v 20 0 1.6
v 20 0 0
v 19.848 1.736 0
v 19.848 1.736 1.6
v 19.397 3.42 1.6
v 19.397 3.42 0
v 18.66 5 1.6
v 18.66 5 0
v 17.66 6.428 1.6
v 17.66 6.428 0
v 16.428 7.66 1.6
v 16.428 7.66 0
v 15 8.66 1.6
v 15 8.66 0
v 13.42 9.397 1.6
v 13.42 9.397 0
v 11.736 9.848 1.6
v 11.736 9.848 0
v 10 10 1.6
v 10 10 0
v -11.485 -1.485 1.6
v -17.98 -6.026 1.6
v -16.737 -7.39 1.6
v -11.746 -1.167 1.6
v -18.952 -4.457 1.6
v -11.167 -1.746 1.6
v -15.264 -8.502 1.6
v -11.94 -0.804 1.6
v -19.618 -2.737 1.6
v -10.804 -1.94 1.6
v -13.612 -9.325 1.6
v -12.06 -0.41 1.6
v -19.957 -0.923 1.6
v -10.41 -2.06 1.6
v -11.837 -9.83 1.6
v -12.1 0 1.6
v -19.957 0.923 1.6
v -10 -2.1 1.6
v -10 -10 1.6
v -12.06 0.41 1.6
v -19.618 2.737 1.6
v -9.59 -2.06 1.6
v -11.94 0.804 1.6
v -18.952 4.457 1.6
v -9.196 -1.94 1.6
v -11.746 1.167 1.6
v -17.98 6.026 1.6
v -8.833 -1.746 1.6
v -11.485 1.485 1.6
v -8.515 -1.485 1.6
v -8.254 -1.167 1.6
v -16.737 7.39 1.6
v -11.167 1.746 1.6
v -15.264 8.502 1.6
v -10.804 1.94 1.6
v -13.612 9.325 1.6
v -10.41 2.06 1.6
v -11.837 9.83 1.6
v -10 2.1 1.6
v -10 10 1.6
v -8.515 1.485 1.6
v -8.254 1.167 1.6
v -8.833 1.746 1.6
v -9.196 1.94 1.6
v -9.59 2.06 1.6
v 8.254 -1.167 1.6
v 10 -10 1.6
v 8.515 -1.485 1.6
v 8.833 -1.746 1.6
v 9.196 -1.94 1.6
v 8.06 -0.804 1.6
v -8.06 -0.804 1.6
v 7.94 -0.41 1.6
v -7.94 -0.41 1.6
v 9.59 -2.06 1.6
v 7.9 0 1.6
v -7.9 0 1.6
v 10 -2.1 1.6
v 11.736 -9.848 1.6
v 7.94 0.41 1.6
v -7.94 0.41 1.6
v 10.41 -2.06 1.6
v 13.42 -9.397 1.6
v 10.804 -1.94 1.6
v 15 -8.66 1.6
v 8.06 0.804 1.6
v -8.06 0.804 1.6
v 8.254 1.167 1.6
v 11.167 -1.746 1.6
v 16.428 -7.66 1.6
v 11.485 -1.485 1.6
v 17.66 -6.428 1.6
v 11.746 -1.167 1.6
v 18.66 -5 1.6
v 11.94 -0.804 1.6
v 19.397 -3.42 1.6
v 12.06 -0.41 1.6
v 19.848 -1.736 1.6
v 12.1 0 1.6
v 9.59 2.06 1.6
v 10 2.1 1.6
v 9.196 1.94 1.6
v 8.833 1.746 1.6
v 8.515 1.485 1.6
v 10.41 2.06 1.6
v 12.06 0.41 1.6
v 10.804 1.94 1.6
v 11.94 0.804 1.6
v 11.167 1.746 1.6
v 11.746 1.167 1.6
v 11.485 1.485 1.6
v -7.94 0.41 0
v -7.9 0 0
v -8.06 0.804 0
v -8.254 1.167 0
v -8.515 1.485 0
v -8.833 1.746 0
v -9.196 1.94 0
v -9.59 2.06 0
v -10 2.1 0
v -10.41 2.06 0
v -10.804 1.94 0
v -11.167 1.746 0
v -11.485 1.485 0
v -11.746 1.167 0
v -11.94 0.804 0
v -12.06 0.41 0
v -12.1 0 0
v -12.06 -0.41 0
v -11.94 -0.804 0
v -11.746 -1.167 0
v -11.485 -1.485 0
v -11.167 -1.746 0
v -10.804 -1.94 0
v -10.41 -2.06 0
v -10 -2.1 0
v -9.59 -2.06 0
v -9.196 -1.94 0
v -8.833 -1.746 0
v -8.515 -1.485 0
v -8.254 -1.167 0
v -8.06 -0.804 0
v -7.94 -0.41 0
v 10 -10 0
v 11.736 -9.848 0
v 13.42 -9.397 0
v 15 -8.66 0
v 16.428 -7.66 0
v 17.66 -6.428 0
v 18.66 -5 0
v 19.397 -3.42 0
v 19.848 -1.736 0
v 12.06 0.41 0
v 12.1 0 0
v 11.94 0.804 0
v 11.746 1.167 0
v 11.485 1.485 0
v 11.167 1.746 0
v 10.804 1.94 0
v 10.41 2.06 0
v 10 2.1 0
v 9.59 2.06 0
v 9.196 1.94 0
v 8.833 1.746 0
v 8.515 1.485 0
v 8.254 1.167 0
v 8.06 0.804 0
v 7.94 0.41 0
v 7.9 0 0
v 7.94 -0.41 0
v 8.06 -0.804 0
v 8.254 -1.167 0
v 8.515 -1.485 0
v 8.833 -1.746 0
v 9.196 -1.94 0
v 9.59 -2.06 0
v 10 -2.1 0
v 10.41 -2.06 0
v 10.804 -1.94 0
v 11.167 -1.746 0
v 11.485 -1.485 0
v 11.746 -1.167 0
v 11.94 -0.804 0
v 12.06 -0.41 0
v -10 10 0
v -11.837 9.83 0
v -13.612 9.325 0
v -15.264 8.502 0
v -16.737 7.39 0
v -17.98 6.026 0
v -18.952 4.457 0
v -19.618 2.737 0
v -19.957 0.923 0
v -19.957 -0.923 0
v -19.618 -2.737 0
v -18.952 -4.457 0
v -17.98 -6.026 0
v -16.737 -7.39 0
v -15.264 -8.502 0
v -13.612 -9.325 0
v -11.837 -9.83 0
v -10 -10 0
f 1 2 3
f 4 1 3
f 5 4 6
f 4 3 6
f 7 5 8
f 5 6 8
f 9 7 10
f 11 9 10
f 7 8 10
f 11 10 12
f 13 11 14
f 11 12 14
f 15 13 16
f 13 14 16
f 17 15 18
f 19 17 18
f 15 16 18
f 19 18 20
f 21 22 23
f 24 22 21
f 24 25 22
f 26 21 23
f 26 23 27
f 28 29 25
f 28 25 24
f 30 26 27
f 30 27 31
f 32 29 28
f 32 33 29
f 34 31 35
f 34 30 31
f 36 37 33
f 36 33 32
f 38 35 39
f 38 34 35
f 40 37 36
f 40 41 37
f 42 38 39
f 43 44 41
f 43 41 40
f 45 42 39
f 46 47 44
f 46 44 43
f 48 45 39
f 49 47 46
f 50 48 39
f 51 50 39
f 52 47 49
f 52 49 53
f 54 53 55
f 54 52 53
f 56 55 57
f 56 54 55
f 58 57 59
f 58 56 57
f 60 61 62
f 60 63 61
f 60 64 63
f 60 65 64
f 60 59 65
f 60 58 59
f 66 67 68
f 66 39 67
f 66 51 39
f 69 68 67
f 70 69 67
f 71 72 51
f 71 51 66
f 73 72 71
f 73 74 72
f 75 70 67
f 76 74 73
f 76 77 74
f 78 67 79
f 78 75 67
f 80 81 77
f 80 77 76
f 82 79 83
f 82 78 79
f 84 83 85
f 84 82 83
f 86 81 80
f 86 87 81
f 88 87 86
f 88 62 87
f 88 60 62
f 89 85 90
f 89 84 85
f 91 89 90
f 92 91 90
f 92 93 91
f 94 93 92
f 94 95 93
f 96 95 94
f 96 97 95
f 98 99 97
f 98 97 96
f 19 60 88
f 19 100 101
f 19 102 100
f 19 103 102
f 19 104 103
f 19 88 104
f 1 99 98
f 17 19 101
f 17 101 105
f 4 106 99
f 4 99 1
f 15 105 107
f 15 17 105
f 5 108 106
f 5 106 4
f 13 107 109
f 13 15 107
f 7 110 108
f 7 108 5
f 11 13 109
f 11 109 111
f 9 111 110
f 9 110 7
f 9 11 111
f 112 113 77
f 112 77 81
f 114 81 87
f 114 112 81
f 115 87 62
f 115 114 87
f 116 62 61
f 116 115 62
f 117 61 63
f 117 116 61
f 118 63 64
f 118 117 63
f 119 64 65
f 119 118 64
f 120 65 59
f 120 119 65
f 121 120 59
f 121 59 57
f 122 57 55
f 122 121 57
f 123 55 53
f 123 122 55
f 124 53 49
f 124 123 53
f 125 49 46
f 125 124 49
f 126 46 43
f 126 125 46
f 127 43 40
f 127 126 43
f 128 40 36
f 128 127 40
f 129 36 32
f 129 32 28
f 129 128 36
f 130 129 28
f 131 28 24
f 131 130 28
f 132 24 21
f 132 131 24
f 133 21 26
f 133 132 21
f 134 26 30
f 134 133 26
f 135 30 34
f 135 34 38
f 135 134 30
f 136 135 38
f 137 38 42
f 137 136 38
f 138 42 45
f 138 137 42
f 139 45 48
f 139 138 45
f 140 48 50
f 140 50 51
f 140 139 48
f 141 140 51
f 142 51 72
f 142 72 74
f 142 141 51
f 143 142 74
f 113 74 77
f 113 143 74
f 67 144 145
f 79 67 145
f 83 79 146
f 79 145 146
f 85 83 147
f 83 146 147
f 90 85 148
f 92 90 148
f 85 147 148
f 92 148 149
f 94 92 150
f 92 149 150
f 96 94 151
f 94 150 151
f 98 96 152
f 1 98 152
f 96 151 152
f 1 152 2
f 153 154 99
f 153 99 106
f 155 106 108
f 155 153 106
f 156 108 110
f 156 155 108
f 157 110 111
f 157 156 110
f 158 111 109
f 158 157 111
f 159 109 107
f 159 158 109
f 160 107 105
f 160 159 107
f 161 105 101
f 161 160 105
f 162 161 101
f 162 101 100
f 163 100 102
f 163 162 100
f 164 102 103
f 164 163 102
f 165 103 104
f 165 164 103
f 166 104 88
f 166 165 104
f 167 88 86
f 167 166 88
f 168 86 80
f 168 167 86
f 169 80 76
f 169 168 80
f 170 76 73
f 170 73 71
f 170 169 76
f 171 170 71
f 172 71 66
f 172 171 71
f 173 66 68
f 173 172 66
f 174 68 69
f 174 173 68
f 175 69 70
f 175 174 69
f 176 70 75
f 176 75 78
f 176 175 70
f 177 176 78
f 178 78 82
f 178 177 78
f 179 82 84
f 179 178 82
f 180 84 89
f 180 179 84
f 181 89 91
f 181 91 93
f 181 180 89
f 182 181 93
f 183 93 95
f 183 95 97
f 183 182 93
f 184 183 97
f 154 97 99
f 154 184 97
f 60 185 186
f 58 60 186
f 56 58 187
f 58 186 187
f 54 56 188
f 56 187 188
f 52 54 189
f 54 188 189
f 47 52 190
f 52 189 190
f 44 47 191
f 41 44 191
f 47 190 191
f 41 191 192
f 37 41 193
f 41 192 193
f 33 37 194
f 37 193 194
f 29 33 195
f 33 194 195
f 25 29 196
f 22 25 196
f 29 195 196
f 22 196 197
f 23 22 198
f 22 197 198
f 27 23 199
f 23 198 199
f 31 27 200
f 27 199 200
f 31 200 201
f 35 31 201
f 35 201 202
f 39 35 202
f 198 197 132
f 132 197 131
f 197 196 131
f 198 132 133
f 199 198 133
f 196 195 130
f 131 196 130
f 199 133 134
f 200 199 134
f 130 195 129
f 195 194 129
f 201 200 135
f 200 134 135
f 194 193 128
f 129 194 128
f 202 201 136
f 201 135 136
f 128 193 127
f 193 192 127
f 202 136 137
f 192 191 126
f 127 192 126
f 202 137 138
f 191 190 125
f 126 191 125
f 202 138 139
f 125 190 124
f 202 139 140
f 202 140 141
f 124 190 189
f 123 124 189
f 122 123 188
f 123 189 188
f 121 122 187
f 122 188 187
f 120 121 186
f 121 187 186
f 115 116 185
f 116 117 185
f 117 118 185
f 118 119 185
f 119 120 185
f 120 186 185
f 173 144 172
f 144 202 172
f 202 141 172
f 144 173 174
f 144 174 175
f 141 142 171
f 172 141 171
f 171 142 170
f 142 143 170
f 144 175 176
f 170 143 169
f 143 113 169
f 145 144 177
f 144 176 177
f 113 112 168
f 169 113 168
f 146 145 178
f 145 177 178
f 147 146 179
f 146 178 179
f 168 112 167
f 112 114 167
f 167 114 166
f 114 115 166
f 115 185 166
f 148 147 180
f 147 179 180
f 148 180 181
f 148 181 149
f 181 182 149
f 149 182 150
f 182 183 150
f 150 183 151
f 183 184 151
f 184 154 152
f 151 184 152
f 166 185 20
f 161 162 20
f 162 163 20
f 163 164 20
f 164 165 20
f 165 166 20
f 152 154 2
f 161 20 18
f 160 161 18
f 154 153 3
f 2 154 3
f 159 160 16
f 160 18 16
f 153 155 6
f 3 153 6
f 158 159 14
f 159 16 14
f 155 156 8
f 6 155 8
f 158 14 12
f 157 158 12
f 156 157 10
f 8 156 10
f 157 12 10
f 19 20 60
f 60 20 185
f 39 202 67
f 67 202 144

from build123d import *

# Parameters (mm, degrees)
F0_R     = 2.1
F1_DEPTH = 1.6


# Not quite as in the source:
# - a feature names something its author has since deleted; it is built from what else it names


with BuildPart() as f1:
    # F0 (on Top) → F1 (new body)
    with BuildSketch(Plane.XY):
        with BuildLine():
            ThreePointArc((-10, -10), (-2.9289321881, -7.0710678119), (0, 0))
            ThreePointArc((0, 0), (-2.9289321881, 7.0710678119), (-10, 10))
            ThreePointArc((-10, 10), (-20, 0), (-10, -10))
        make_face()
        with Locations((-10, 0)):
            Circle(F0_R, mode=Mode.SUBTRACT)
        with BuildLine():
            ThreePointArc((10, 10), (2.9289321881, 7.0710678119), (0, 0))
            ThreePointArc((0, 0), (2.9289321881, -7.0710678119), (10, -10))
            ThreePointArc((10, -10), (17.0710678119, -7.0710678119), (20, 0))
            ThreePointArc((20, 0), (17.0710678119, 7.0710678119), (10, 10))
        make_face()
        with Locations((10, 0)):
            Circle(F0_R, mode=Mode.SUBTRACT)
        with BuildLine():
            ThreePointArc((-10, 10), (-2.9289321881, 7.0710678119), (0, 0))
            ThreePointArc((0, 0), (2.9289321881, 7.0710678119), (10, 10))
            Line((10, 10), (-10, 10))
        make_face()
        with BuildLine():
            ThreePointArc((10, -10), (2.9289321881, -7.0710678119), (0, 0))
            ThreePointArc((0, 0), (-2.9289321881, -7.0710678119), (-10, -10))
            Line((-10, -10), (10, -10))
        make_face()
    extrude(amount=F1_DEPTH)


solid = f1.part
